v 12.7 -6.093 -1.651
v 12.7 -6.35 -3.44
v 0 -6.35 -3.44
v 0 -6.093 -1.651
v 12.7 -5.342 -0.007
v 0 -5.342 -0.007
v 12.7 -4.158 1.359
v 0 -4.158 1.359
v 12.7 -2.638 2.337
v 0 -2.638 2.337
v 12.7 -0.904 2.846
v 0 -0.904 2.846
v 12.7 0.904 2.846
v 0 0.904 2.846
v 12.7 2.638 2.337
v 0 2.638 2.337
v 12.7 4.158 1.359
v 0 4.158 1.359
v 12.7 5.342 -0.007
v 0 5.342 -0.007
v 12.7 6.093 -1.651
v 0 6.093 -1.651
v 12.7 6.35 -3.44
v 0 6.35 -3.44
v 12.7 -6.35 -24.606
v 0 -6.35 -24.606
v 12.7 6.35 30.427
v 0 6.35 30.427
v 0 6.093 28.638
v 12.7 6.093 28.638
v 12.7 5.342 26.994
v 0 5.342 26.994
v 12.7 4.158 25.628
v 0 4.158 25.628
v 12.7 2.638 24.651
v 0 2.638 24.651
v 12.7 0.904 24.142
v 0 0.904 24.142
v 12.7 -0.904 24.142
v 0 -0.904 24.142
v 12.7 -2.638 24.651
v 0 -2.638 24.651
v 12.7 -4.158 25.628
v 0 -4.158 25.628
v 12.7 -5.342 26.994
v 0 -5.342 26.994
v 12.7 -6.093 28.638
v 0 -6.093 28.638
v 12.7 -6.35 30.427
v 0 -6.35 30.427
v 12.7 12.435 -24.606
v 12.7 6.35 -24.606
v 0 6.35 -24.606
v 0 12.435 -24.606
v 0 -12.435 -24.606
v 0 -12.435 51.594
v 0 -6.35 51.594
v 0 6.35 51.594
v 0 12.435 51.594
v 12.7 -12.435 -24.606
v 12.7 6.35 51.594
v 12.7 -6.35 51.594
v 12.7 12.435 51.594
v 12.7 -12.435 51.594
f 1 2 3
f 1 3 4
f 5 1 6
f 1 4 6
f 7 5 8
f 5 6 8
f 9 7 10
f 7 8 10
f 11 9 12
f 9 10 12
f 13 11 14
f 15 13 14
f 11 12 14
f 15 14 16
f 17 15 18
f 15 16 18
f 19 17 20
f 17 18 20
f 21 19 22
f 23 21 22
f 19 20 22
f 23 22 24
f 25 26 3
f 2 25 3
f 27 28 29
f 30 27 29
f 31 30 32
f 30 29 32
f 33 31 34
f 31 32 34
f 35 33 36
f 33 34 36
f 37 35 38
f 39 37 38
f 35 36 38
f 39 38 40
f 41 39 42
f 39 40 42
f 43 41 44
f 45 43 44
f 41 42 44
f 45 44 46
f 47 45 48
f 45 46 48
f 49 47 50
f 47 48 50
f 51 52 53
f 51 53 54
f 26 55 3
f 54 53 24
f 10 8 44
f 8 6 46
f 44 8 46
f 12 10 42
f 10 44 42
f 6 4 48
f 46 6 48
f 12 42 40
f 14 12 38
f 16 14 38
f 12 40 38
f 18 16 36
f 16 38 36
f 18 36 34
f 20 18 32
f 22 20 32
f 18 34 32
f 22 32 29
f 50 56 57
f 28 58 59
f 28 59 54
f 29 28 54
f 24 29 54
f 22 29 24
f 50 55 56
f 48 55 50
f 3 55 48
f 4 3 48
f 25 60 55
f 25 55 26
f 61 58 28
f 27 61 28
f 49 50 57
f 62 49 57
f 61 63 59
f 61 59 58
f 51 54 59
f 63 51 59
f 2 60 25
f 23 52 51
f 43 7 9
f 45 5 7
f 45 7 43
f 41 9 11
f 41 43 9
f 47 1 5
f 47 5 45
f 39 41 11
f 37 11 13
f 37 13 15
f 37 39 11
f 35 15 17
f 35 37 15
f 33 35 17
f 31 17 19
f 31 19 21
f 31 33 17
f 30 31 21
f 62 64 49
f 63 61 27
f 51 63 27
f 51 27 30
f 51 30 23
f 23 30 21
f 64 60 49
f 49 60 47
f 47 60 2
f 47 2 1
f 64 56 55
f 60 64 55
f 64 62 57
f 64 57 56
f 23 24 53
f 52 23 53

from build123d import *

# Parameters (mm, degrees)
F1_DEPTH = 12.7


with BuildPart() as f1:
    # F0 (on Right) → F1 (new body)
    with BuildSketch(Plane.YZ):
        with BuildLine():
            Line((6.35, -24.606245), (12.435416, -24.606245))
            Line((12.435416, -24.606245), (12.435416, 51.593755))
            Line((12.435416, 51.593755), (6.35, 51.593755))
            Line((6.35, 51.593755), (6.35, 30.427093))
            ThreePointArc((6.35, 30.427093), (0, 24.077093), (-6.35, 30.427093))
            Line((-6.35, 30.427093), (-6.35, 51.593755))
            Line((-6.35, 51.593755), (-12.435416, 51.593755))
            Line((-12.435416, 51.593755), (-12.435416, -24.606245))
            Line((-12.435416, -24.606245), (-6.35, -24.606245))
            Line((-6.35, -24.606245), (-6.35, -3.439584))
            ThreePointArc((-6.35, -3.439584), (0, 2.910416), (6.35, -3.439584))
            Line((6.35, -3.439584), (6.35, -24.606245))
        make_face()
    extrude(amount=F1_DEPTH)


solid = f1.part
